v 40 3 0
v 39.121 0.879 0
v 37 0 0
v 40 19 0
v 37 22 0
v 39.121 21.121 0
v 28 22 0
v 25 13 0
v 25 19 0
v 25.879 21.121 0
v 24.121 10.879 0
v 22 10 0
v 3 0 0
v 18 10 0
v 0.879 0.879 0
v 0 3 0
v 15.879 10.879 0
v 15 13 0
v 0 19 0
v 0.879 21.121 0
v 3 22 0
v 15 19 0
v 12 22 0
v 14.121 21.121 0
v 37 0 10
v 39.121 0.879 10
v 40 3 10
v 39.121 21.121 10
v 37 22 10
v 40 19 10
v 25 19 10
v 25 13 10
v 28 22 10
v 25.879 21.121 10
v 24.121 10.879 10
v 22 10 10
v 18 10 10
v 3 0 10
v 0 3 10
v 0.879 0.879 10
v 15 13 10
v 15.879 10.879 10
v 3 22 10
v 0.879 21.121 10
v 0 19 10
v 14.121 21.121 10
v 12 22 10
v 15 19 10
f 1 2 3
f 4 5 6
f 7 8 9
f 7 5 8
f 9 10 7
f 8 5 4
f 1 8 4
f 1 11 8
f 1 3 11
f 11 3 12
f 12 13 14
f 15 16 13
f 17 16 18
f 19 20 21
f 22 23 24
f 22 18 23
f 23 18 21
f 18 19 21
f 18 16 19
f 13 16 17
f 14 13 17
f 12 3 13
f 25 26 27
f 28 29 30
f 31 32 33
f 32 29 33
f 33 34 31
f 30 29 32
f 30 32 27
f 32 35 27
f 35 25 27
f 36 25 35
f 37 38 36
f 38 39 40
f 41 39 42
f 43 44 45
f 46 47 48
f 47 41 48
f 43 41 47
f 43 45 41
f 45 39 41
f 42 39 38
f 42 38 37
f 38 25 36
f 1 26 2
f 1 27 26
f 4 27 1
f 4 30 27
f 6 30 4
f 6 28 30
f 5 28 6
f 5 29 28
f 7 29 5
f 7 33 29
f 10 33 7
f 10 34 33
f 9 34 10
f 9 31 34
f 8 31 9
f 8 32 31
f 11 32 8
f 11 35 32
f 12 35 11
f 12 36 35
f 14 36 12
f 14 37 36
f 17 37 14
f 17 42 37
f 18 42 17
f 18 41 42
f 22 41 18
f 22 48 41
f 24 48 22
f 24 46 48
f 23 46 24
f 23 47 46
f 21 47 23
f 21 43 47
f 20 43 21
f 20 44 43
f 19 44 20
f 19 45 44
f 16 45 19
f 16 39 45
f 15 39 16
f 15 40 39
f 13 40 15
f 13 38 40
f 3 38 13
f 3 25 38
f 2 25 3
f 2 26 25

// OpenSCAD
$fn = 32;

// ----------------------------------------------------------------------
// Eye lug: clevis, 10 mm thick
// ----------------------------------------------------------------------

// --- parameters (mm) ---
profile_height = 10;      // extrusion height
profile_points = 24;      // points of the closed outline

profile = [[0, 3], [0.879, 0.879], [3, 0], [37, 0], [39.121, 0.879], [40, 3], [40, 19], [39.121, 21.121], [37, 22], [28, 22], [25.879, 21.121], [25, 19], [25, 13], [24.121, 10.879], [22, 10], [18, 10], [15.879, 10.879], [15, 13], [15, 19], [14.121, 21.121], [12, 22], [3, 22], [0.879, 21.121], [0, 19]];  // single closed polygon, 24 points, counter clockwise

// --- the one profile operation ---
linear_extrude(height = profile_height) polygon(points = profile);
